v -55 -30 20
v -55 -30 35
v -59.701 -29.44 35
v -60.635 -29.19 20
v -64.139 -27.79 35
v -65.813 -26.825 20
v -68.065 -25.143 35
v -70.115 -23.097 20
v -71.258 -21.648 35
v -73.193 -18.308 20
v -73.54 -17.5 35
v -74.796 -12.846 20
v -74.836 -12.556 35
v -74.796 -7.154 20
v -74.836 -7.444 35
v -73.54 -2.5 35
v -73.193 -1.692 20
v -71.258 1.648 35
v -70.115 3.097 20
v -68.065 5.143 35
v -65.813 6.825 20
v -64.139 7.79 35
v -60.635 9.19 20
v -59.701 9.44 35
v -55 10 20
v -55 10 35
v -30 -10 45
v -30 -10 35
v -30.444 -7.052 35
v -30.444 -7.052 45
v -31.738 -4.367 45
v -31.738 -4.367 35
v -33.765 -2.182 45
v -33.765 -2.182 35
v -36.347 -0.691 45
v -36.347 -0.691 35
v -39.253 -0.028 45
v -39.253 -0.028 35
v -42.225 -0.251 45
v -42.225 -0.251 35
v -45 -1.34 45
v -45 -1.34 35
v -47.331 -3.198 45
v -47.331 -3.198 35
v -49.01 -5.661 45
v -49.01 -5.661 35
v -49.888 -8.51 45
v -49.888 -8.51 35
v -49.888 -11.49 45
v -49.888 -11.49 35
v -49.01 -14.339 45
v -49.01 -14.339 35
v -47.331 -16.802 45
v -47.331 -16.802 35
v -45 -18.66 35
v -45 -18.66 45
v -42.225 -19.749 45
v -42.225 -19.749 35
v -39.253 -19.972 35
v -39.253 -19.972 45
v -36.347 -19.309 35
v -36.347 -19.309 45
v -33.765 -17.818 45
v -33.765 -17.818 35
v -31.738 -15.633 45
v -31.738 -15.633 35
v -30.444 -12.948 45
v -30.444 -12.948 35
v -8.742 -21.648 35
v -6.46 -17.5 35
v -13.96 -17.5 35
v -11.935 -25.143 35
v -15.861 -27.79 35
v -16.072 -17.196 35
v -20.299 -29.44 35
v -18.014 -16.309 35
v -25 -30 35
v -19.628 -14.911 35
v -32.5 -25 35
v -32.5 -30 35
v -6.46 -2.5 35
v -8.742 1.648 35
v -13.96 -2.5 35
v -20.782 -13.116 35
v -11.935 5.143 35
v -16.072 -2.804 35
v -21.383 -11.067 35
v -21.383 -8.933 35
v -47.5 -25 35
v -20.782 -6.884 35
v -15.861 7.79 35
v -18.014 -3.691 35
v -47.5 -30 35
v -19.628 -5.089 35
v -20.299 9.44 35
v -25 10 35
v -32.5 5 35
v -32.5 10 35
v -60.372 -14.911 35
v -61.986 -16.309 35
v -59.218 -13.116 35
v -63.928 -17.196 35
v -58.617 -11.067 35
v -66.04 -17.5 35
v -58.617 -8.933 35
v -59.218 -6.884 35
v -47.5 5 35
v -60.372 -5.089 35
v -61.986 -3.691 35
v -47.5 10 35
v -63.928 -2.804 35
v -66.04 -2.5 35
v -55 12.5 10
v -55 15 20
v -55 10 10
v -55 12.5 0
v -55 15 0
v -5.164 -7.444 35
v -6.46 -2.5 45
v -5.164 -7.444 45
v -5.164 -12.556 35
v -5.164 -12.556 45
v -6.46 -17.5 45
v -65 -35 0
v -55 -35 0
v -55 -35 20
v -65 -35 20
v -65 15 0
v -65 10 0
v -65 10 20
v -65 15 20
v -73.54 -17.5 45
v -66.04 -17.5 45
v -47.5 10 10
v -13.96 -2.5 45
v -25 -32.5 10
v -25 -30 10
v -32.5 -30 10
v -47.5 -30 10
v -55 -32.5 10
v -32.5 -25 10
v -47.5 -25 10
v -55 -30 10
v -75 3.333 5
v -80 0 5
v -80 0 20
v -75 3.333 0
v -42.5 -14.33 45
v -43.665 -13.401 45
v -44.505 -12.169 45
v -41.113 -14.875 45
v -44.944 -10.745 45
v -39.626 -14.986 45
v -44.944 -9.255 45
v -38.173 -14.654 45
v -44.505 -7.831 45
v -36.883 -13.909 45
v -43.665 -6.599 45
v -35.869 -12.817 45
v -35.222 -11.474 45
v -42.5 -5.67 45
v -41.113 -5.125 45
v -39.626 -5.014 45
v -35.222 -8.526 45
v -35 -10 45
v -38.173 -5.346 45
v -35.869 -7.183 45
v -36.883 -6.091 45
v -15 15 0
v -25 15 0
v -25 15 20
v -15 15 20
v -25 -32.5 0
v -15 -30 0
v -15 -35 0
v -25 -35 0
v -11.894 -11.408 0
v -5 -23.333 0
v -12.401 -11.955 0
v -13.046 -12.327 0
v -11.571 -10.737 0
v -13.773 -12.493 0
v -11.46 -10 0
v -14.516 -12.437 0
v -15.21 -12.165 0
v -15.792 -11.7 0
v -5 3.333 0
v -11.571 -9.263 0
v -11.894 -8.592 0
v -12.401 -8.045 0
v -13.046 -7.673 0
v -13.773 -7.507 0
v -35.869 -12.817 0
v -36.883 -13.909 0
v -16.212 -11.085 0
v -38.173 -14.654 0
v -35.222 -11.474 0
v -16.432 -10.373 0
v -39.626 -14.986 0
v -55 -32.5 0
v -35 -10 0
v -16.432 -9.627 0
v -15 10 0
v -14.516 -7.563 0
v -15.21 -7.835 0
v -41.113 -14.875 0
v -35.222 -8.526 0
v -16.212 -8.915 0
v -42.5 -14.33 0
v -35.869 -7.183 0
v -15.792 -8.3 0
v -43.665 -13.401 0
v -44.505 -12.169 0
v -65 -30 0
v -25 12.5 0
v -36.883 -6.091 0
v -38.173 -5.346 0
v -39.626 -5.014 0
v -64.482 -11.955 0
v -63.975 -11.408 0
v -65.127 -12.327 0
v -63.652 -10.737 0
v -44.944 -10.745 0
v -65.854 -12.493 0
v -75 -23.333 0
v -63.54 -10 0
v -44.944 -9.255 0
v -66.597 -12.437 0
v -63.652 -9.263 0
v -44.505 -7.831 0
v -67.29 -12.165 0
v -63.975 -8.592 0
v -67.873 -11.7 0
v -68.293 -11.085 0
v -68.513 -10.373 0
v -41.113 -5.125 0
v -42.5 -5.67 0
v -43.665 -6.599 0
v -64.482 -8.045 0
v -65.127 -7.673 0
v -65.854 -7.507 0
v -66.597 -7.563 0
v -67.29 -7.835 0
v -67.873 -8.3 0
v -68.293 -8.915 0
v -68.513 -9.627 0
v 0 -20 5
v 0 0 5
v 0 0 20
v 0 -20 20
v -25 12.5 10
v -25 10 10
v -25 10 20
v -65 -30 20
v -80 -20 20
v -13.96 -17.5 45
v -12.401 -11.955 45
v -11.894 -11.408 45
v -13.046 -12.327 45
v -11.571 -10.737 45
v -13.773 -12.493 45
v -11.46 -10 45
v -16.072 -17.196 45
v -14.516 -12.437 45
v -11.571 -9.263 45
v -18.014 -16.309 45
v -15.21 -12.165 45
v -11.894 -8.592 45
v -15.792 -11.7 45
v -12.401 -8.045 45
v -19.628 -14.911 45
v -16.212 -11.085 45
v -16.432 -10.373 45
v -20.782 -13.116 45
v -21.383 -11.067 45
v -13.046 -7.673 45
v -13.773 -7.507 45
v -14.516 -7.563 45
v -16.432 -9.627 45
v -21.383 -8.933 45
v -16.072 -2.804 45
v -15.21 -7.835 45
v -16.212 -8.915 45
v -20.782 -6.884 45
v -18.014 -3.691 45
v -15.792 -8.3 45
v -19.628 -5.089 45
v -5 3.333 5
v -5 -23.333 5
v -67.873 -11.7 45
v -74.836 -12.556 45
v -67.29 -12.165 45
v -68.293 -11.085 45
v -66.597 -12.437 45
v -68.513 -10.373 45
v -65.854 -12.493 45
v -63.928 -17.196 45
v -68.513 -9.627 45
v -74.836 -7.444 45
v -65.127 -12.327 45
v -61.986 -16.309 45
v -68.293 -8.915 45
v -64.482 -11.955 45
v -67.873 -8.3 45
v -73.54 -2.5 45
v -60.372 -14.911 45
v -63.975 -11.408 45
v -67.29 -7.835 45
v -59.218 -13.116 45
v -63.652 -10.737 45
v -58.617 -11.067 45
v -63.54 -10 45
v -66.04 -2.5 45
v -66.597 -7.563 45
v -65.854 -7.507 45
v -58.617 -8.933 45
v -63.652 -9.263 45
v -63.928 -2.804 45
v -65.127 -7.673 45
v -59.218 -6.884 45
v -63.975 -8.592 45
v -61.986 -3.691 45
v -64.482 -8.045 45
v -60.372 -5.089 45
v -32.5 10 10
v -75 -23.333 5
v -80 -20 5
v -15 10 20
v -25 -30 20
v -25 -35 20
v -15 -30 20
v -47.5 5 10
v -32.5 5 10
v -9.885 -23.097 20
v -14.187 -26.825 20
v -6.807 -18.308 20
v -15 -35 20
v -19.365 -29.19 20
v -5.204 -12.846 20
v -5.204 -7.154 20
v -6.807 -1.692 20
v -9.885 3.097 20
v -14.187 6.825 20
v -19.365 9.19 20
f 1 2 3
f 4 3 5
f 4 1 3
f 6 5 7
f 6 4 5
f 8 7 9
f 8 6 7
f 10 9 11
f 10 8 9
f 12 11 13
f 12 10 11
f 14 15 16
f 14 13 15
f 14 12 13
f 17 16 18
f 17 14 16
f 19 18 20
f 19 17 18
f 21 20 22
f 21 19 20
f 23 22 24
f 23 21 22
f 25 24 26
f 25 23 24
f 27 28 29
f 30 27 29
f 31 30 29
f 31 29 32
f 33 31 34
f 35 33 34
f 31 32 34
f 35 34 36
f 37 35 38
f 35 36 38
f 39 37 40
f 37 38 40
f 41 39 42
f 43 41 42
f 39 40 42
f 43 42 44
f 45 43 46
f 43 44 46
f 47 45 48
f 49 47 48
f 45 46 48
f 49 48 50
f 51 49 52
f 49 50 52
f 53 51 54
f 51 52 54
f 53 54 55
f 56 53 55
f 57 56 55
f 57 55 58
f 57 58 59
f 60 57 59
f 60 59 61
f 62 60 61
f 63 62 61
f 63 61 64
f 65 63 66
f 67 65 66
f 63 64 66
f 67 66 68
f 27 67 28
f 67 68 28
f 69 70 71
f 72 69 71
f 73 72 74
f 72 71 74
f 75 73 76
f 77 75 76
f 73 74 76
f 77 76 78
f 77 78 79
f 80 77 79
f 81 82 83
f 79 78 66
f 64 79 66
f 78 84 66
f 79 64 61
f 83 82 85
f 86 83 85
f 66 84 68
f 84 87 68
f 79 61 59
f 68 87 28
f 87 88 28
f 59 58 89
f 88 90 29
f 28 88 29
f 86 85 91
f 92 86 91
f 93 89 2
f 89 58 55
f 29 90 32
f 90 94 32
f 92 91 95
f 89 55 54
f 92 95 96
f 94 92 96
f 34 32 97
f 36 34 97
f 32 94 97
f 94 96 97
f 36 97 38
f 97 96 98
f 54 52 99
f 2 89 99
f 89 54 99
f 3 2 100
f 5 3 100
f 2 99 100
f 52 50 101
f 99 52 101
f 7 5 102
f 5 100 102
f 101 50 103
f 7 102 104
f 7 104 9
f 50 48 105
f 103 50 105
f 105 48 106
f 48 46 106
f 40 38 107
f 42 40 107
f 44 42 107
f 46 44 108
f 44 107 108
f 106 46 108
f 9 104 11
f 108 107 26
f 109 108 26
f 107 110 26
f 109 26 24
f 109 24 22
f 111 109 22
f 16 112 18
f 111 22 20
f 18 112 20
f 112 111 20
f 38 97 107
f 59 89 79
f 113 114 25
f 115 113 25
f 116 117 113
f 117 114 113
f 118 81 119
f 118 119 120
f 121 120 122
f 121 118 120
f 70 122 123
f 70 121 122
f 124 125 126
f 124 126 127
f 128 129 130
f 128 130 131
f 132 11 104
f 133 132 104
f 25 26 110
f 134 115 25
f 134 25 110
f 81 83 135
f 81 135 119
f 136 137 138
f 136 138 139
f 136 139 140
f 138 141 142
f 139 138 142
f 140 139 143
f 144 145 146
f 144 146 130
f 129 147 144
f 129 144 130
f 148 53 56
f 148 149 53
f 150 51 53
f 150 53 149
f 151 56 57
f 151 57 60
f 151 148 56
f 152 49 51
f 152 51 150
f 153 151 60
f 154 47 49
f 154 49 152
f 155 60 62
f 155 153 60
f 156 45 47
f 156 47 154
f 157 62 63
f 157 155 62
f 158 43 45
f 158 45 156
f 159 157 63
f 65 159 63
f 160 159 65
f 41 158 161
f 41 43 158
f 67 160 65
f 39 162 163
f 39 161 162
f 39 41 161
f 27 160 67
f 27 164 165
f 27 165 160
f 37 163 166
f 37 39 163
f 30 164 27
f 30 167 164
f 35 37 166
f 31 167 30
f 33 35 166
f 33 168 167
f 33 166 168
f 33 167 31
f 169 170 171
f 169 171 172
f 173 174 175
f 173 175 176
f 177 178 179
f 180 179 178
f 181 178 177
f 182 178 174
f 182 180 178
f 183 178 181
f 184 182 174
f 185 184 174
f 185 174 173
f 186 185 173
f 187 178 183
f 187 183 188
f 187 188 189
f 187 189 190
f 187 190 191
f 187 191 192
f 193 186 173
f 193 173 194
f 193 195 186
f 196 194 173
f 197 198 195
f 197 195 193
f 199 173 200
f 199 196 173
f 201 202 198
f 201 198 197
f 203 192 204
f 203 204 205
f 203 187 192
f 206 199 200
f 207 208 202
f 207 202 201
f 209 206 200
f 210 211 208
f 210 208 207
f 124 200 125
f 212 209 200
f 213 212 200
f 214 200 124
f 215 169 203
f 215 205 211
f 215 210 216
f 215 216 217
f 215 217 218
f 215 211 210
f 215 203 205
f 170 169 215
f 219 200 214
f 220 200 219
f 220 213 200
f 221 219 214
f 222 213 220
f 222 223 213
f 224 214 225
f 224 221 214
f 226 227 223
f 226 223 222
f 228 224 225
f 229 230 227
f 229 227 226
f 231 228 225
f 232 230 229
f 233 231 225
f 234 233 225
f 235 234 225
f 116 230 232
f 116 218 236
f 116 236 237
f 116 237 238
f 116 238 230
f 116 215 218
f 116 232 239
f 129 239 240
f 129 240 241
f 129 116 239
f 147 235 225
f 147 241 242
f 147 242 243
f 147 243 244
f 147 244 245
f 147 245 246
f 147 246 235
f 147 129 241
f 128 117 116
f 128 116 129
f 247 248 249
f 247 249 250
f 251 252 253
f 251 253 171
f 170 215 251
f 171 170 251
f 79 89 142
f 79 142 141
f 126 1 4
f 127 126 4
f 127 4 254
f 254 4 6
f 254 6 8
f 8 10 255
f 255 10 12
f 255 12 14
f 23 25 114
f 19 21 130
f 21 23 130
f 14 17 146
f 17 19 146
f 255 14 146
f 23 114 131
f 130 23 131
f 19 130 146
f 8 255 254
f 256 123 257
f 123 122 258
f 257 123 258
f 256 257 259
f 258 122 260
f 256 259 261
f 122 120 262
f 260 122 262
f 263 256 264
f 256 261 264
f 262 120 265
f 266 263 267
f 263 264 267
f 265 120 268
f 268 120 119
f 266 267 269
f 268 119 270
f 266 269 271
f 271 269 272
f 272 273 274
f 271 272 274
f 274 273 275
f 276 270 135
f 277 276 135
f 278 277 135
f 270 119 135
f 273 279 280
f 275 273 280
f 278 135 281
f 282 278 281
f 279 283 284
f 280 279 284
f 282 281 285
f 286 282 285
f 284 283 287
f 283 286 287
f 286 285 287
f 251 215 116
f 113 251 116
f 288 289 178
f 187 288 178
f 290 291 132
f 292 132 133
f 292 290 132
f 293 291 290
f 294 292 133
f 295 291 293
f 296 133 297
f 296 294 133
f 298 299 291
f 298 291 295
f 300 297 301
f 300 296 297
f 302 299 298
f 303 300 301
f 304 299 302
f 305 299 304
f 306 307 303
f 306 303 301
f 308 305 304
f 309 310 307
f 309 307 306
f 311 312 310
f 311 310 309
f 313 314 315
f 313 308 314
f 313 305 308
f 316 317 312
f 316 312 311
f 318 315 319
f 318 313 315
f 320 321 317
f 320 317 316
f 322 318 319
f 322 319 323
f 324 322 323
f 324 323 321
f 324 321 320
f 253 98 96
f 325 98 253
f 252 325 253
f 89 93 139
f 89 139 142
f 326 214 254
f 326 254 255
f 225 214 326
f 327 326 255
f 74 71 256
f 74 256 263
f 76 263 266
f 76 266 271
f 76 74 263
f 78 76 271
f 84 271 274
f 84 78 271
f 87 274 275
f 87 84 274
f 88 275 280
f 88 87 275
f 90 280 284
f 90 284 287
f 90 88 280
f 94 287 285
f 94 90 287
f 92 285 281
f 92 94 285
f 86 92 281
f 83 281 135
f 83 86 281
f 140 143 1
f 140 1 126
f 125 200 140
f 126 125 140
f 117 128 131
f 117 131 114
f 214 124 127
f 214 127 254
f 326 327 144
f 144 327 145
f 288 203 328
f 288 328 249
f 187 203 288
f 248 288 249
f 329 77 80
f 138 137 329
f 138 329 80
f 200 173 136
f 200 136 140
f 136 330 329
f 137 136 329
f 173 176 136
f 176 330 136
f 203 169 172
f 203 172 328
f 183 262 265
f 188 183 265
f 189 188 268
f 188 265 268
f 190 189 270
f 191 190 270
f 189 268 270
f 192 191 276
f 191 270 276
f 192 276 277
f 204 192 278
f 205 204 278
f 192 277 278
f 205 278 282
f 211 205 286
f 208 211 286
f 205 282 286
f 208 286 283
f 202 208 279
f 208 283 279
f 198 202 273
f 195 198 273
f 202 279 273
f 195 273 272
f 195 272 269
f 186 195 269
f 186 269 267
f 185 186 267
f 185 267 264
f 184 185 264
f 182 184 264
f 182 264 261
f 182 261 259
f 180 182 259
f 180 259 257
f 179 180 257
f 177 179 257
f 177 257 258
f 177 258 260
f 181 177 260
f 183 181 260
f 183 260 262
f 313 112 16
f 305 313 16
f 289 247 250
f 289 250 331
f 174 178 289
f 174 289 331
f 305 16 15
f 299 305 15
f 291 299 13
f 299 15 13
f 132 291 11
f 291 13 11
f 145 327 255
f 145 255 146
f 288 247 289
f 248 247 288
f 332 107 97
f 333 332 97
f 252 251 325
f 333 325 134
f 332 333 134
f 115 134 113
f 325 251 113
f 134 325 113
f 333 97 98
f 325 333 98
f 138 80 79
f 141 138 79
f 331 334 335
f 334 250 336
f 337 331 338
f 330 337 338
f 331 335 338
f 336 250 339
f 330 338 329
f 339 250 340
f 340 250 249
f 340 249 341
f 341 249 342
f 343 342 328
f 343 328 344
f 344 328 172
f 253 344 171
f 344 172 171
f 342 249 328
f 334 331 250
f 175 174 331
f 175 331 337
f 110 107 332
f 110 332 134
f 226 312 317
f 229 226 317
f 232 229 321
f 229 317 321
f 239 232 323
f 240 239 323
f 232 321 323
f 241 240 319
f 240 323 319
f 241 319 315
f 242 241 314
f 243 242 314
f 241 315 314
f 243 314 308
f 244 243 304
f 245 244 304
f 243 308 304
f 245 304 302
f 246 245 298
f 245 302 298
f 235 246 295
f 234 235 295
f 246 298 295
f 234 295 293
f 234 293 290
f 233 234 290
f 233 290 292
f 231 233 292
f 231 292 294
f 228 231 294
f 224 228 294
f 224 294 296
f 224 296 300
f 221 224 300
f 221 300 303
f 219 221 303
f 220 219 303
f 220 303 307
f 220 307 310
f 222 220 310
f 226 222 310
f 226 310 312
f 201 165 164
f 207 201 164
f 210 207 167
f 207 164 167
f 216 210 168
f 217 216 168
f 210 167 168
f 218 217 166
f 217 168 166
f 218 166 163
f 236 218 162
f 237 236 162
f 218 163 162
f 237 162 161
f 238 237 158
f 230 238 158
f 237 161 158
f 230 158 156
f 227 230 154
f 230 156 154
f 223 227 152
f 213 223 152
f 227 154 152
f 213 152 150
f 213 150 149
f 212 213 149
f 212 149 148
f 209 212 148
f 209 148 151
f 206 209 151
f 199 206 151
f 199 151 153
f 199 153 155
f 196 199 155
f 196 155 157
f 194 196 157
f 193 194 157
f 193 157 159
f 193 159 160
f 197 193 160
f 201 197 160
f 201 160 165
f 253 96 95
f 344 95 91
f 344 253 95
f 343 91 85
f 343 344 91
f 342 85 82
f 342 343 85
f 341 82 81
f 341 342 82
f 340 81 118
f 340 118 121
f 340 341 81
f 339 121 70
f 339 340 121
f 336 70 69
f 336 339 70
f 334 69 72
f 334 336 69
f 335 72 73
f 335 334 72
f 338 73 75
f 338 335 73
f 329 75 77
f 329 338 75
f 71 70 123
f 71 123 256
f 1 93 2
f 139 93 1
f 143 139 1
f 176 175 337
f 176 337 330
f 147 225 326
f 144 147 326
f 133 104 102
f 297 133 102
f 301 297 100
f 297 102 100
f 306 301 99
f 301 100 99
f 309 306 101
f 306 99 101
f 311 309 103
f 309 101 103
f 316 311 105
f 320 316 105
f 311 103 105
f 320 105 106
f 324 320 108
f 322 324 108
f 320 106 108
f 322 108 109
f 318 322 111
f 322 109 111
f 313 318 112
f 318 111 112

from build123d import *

# Parameters (mm, degrees)
BOSS_EXTRUDE1_DEPTH = 20
SKETCH2_W           = 5
SKETCH2_H           = 27.5
CUT_EXTRUDE2_DEPTH  = 5
SKETCH3_W           = 5
SKETCH3_H           = 27.5
CUT_EXTRUDE3_DEPTH  = 5
BOSS_EXTRUDE2_DEPTH = 15
SKETCH5_W           = 30
SKETCH5_H           = 2.5
BOSS_EXTRUDE3_DEPTH = 10
SKETCH6_W           = 15
SKETCH6_H           = 5
CUT_EXTRUDE4_DEPTH  = 25
SKETCH7_R           = 10
BOSS_EXTRUDE4_DEPTH = 10
SKETCH8_R           = 5
CUT_EXTRUDE5_DEPTH  = 310
BOSS_EXTRUDE5_DEPTH = 10
SKETCH11_R          = 2.5
CUT_EXTRUDE6_DEPTH  = 300


with BuildPart() as part:
    # Sketch1 → Boss-Extrude1 (new body)
    with BuildSketch(Plane.XY):
        Polygon((-80, 0), (-65, 10), (-65, 15), (-55, 15), (-55, 10), (-25, 10), (-25, 15), (-15, 15), (-15, 10), (0, 0), (0, -20), (-15, -30), (-15, -35), (-25, -35), (-25, -30), (-55, -30), (-55, -35), (-65, -35), (-65, -30), (-80, -20), align=None)
    extrude(amount=BOSS_EXTRUDE1_DEPTH)

    # Sketch2 → Cut-Extrude2 (cut)
    with BuildSketch(Plane.ZY.offset(80)):
        with Locations((2.5, -10)):
            Rectangle(SKETCH2_W, SKETCH2_H)
    extrude(amount=-CUT_EXTRUDE2_DEPTH, mode=Mode.SUBTRACT)

    # Sketch3 → Cut-Extrude3 (cut)
    with BuildSketch(Plane(origin=(0, 0, 0), x_dir=(0, 0, -1), z_dir=(1, 0, 0))):
        with Locations((-2.5, -10)):
            Rectangle(SKETCH3_W, SKETCH3_H)
    extrude(amount=-CUT_EXTRUDE3_DEPTH, mode=Mode.SUBTRACT)

    # Sketch4 → Boss-Extrude2 (add)
    with BuildSketch(Plane.XY.offset(20)):
        with BuildLine():
            Line((-55, 10), (-25, 10))
            ThreePointArc((-25, 10), (-5, -10), (-25, -30))
            Line((-25, -30), (-55, -30))
            ThreePointArc((-55, -30), (-75, -10), (-55, 10))
        make_face()
    extrude(amount=BOSS_EXTRUDE2_DEPTH)

    # Sketch5 → Boss-Extrude3 (add)
    with BuildSketch(Plane(origin=(0, 0, 0), x_dir=(-1, 0, 0), z_dir=(0, 0, -1))):
        with Locations((40, -31.25)):
            Rectangle(SKETCH5_W, SKETCH5_H)
        with Locations((40, 11.25)):
            Rectangle(SKETCH5_W, SKETCH5_H)
    extrude(amount=-BOSS_EXTRUDE3_DEPTH)

    # Sketch6 → Cut-Extrude4 (cut)
    with BuildSketch(Plane.XY.offset(35)):
        with Locations((-40, -27.5)):
            Rectangle(SKETCH6_W, SKETCH6_H)
        with Locations((-40, 7.5)):
            Rectangle(SKETCH6_W, SKETCH6_H)
    extrude(amount=-CUT_EXTRUDE4_DEPTH, mode=Mode.SUBTRACT)

    # Sketch7 → Boss-Extrude4 (add)
    with BuildSketch(Plane.XY.offset(35)):
        with Locations((-40, -10)):
            Circle(SKETCH7_R)
    extrude(amount=BOSS_EXTRUDE4_DEPTH)

    # Sketch8 → Cut-Extrude5 (cut)
    with BuildSketch(Plane.XY.offset(45)):
        with Locations((-40, -10)):
            Circle(SKETCH8_R)
    extrude(amount=-CUT_EXTRUDE5_DEPTH, mode=Mode.SUBTRACT)

    # Sketch10 → Boss-Extrude5 (add)
    with BuildSketch(Plane.XY.offset(35)):
        with BuildLine():
            Line((-73.540496218, -17.5), (-66.040496218, -17.5))
            ThreePointArc((-66.040496218, -17.5), (-58.540496218, -10), (-66.040496218, -2.5))
            Line((-66.040496218, -2.5), (-73.540496218, -2.5))
            ThreePointArc((-73.540496218, -2.5), (-75, -10), (-73.540496218, -17.5))
        make_face()
        with BuildLine():
            Line((-6.459503782, -17.5), (-13.959503782, -17.5))
            ThreePointArc((-13.959503782, -17.5), (-21.459503782, -10), (-13.959503782, -2.5))
            Line((-13.959503782, -2.5), (-6.459503782, -2.5))
            ThreePointArc((-6.459503782, -2.5), (-5, -10), (-6.459503782, -17.5))
        make_face()
    extrude(amount=BOSS_EXTRUDE5_DEPTH)

    # Sketch11 → Cut-Extrude6 (cut)
    with BuildSketch(Plane.XY.offset(45)):
        with Locations((-66.040496218, -10)):
            Circle(SKETCH11_R)
        with Locations((-13.959503782, -10)):
            Circle(SKETCH11_R)
    extrude(amount=-CUT_EXTRUDE6_DEPTH, mode=Mode.SUBTRACT)


solid = part.part
